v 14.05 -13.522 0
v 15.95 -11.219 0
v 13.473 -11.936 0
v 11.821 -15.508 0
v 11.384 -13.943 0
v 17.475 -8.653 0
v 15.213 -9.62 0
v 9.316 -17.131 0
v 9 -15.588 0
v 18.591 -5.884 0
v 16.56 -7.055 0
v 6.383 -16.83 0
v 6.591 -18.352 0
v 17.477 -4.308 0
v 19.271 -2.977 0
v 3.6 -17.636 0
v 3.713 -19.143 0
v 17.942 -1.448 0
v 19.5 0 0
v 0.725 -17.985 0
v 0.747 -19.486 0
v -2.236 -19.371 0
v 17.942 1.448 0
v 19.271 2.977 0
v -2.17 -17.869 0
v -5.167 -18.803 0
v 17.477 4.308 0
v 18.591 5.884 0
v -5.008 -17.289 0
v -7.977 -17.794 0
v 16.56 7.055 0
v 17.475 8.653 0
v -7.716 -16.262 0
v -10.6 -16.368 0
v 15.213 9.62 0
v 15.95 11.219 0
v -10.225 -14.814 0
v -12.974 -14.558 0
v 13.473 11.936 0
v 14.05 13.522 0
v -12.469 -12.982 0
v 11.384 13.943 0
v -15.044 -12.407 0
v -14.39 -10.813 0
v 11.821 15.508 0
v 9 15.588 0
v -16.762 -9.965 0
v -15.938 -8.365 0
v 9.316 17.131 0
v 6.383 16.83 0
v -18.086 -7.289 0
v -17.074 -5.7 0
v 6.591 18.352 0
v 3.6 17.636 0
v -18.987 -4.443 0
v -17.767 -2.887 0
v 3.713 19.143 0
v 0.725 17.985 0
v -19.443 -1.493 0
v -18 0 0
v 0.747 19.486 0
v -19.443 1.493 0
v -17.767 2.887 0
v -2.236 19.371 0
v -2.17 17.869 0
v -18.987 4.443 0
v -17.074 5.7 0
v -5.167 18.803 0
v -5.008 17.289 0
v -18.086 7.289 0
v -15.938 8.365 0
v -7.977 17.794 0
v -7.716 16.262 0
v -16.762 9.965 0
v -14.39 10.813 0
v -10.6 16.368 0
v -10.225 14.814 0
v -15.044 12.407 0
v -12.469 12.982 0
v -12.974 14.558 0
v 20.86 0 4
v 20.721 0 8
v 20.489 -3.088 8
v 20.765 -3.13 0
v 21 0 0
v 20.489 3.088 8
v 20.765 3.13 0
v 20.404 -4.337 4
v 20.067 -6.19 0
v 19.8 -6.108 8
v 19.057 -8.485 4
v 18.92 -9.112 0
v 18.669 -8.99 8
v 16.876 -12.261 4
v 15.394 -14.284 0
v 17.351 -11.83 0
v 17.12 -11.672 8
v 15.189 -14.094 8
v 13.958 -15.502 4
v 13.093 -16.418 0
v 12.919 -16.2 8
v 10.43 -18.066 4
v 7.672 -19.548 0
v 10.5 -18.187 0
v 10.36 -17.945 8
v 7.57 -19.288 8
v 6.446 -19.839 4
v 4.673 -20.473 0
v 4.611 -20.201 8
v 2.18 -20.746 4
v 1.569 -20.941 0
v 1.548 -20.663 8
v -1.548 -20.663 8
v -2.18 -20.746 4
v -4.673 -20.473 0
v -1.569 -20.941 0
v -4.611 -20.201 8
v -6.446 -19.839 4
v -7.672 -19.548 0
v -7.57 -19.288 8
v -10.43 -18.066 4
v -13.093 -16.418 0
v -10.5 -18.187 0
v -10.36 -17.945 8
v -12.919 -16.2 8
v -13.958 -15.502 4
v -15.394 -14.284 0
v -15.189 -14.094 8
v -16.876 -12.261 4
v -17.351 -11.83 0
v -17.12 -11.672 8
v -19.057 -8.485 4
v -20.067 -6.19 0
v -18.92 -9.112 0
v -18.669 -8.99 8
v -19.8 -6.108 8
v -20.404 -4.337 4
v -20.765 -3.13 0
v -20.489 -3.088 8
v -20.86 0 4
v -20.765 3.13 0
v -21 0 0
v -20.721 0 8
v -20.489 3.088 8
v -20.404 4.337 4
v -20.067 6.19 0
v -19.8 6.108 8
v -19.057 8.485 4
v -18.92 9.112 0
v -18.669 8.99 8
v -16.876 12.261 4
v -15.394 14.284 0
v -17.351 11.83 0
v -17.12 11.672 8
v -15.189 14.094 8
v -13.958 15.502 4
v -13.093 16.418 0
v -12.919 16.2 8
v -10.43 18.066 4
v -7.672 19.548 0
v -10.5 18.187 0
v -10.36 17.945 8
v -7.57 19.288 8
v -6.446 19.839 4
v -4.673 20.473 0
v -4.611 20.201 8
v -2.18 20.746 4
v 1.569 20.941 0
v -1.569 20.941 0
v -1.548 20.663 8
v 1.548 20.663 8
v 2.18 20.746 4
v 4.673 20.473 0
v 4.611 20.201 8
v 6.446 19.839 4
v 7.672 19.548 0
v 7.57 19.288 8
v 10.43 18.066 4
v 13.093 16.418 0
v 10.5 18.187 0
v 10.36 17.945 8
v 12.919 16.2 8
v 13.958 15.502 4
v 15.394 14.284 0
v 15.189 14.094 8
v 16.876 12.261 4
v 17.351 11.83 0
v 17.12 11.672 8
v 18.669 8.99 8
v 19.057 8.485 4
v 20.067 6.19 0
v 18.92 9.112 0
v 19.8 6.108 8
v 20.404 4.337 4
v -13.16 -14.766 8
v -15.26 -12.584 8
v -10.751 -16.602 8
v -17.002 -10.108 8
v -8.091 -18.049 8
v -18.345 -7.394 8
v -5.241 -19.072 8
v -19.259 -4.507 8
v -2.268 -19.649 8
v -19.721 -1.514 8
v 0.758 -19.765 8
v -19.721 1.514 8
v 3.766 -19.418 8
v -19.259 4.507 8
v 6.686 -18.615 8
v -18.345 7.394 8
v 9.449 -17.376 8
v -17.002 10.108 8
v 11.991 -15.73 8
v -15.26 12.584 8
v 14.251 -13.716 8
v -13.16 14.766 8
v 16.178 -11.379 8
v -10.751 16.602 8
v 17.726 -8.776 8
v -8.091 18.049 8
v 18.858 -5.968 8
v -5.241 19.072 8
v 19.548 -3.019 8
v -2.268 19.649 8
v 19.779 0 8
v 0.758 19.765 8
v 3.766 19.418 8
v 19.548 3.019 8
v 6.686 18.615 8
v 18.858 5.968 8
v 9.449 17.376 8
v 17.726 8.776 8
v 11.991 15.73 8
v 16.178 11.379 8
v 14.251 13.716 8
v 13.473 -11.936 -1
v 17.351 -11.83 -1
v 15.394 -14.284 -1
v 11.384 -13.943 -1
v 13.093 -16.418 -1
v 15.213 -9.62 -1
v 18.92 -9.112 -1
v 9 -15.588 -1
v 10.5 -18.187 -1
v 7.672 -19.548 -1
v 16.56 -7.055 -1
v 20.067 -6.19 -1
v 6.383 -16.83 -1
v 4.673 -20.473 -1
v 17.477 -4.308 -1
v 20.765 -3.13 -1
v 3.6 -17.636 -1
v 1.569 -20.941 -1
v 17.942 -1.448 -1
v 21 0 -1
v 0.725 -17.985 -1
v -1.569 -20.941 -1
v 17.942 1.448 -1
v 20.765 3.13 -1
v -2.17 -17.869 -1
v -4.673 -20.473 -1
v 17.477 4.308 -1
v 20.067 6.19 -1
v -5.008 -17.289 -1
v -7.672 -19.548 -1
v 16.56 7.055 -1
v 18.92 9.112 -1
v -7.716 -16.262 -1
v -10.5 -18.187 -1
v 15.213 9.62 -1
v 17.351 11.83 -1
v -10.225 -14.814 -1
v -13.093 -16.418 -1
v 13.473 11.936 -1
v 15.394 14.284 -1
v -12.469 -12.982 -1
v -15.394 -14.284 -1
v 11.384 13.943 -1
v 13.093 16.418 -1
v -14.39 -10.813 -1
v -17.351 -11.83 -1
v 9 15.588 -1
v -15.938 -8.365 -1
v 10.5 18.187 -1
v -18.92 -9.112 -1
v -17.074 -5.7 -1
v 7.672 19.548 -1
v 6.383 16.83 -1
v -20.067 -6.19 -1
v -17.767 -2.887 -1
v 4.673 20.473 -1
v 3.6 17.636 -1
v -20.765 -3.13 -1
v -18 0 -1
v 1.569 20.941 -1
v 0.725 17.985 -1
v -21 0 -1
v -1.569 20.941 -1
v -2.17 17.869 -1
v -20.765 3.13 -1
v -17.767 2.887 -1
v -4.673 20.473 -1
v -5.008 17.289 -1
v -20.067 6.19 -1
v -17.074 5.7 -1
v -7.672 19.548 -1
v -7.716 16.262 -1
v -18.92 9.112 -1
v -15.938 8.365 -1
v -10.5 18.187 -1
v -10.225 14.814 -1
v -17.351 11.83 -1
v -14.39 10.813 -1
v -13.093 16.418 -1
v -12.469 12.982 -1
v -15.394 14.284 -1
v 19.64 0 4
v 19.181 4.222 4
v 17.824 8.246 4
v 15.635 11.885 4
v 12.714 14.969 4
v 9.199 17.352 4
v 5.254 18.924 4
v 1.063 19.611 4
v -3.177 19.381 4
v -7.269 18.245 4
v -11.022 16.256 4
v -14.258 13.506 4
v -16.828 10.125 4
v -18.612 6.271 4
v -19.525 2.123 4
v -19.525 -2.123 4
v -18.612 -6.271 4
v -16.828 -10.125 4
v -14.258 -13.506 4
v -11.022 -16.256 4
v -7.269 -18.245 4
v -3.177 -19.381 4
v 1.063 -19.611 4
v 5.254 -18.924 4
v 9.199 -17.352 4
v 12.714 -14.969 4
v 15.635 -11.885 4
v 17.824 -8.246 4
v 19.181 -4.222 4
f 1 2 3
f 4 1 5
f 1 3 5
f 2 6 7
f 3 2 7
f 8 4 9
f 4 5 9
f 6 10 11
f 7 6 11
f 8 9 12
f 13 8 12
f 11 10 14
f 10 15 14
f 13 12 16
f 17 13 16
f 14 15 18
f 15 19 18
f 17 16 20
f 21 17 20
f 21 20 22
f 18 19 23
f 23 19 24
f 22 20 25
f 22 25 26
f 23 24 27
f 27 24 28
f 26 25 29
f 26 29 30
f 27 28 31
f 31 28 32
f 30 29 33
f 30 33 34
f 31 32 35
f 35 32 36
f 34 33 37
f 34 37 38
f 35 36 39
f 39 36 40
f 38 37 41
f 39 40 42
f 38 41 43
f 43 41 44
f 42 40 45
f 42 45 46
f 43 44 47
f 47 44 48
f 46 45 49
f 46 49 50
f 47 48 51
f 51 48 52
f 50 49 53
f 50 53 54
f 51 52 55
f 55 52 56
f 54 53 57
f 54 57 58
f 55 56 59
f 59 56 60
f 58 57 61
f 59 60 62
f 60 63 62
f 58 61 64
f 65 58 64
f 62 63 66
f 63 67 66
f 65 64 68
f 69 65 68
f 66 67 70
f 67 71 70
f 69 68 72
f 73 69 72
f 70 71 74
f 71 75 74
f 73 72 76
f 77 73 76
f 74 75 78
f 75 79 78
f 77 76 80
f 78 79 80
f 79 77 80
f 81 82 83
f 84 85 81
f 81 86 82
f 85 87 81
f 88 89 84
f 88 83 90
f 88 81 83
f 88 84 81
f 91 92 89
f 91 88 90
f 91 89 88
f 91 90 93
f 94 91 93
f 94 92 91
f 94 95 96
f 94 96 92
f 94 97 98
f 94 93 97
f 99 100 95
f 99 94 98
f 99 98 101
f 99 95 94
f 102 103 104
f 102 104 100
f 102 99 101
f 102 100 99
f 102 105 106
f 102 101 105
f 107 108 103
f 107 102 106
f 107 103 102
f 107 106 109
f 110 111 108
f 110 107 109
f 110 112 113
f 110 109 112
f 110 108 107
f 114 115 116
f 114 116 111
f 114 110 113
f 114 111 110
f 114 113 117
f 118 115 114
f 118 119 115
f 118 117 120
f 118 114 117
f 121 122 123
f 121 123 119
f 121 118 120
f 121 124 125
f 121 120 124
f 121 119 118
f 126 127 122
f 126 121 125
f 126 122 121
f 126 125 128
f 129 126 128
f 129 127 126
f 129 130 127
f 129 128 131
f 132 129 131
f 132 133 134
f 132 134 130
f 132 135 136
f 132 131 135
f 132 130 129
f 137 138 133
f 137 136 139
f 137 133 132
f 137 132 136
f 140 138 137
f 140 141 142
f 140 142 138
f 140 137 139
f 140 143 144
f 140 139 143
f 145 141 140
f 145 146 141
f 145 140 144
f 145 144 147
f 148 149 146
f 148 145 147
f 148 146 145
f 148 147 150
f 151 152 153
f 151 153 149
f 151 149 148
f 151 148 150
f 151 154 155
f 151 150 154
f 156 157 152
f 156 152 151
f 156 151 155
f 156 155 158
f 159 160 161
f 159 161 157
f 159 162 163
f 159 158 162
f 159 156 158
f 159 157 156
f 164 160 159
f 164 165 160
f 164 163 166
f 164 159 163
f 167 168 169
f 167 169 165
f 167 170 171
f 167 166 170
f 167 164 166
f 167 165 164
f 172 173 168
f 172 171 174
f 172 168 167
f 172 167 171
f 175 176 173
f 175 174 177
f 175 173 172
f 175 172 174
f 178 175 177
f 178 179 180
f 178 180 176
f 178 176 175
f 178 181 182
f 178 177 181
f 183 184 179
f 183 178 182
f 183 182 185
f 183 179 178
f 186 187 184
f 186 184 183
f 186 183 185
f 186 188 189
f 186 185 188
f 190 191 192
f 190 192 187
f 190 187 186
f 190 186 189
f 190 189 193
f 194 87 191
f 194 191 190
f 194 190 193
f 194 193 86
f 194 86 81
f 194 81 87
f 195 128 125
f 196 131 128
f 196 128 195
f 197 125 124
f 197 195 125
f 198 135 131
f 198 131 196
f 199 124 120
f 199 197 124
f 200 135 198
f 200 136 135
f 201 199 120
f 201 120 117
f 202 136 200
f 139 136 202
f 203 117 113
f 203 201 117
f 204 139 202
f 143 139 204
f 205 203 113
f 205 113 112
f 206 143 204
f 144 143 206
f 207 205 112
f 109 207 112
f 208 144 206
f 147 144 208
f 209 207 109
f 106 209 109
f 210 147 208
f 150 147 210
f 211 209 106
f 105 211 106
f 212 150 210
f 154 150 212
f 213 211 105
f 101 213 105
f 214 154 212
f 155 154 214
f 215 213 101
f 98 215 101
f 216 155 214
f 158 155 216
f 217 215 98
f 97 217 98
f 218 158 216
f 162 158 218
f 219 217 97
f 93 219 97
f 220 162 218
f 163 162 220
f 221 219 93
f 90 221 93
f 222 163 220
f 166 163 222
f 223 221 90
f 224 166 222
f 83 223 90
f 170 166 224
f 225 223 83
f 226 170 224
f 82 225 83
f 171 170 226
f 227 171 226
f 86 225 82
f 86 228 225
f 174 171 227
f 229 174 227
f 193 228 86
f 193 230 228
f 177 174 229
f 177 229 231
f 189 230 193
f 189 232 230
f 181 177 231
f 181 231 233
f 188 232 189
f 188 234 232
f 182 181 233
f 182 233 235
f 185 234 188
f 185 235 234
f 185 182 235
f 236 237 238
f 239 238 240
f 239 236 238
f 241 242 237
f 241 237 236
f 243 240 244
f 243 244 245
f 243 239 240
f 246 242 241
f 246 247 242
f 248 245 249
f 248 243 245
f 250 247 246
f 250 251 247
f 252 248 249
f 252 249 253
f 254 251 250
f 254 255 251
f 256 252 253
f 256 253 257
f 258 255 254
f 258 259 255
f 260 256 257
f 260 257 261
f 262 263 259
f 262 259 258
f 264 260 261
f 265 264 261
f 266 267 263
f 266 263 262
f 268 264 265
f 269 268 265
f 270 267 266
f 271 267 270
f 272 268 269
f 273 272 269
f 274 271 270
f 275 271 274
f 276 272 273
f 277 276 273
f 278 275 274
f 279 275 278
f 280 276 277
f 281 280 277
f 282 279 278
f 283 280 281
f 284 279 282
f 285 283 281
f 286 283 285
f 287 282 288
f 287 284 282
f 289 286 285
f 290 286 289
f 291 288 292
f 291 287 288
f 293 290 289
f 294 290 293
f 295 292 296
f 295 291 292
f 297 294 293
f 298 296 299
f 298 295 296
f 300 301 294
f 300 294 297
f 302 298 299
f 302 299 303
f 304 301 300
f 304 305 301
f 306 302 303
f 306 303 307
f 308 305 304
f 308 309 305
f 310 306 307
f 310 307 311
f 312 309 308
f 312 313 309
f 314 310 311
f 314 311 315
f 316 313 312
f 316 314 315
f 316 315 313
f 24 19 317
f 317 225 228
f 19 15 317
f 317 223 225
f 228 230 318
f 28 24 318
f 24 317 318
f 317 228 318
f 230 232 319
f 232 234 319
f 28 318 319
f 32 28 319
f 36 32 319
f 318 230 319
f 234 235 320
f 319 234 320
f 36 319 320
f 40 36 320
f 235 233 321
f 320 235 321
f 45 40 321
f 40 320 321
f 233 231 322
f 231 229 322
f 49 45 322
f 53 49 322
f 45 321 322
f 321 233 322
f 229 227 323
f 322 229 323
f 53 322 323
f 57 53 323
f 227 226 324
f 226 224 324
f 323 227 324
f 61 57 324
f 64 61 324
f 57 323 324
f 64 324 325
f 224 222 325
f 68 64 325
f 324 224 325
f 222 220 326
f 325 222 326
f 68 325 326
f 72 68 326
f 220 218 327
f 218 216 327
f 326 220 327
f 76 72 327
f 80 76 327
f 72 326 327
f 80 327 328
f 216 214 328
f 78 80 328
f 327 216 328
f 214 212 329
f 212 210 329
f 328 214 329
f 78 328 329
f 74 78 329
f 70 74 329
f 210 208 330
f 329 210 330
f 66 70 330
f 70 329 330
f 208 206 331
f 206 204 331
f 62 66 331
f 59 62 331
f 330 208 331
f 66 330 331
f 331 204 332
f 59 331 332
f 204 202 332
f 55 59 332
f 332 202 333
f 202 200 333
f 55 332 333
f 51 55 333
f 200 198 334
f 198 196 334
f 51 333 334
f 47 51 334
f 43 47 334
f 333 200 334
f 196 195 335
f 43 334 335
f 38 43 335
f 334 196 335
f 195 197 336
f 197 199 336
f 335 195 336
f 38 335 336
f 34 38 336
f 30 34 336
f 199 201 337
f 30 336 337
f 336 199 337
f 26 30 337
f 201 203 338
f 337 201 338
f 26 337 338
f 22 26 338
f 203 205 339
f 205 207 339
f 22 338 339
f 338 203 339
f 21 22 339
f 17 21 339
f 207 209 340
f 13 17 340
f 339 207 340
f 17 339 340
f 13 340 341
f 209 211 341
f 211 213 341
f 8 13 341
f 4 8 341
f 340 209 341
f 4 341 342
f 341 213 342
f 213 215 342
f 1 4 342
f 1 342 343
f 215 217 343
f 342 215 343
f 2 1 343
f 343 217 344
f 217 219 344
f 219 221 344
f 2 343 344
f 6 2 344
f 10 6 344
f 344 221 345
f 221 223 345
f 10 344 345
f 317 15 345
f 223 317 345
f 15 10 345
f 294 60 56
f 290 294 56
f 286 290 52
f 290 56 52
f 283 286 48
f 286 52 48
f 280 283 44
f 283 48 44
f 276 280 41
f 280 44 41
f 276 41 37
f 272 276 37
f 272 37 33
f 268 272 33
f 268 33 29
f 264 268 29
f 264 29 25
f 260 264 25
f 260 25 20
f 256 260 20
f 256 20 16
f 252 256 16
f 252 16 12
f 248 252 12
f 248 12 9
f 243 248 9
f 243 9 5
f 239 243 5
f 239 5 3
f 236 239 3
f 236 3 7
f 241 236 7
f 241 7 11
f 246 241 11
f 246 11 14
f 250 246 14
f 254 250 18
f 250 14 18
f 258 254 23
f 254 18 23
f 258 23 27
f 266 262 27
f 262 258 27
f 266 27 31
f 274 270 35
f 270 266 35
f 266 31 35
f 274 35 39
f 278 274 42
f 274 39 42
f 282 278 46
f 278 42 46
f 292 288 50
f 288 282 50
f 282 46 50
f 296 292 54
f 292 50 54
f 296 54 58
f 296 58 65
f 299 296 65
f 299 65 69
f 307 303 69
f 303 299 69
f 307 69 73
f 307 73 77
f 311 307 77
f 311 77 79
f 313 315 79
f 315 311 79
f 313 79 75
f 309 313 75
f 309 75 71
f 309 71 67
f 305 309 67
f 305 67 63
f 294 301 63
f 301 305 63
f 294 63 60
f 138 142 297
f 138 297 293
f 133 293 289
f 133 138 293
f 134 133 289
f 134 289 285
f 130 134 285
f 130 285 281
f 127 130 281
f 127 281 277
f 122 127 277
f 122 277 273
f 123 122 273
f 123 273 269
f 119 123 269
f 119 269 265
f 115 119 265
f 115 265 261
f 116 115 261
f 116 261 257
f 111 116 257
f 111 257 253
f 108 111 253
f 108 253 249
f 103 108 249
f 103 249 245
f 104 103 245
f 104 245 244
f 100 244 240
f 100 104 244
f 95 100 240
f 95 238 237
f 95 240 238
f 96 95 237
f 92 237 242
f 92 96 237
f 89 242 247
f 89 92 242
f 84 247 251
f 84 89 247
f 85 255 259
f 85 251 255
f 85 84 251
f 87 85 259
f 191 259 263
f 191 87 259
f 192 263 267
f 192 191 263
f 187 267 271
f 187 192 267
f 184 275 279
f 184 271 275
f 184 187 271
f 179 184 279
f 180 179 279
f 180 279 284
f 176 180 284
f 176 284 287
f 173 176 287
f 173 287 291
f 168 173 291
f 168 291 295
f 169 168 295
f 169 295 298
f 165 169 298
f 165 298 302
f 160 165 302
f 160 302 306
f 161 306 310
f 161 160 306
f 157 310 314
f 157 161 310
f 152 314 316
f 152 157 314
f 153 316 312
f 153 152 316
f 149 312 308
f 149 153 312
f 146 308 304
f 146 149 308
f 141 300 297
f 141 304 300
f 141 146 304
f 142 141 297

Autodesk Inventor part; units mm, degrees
ref_plane "YZ Plane" through (0, 0, 0) normal (1, 0, 0) x (0, 1, 0)
ref_plane "XZ Plane" through (0, 0, 0) normal (0, 1, 0) x (-1, 0, 0)
ref_plane "XY Plane" through (0, 0, 0) normal (0, 0, 1) x (1, 0, 0)
sketch "Skizze1" plane through (0, 0, 0) normal (0, 0, 1) x (1, 0, 0)
  circle A0 centre (0, 0) radius 19.5
  circle A1 centre (0, 0) radius 21
  dimension "d0" = 39
  dimension "d1" = 42
extrude "Extrusion1" add sketch "Skizze1" along normal blind 8 draft -2
sketch "Skizze2" plane through (0, 0, 0) normal (0, 0, -1) x (-1, 0, 0)
  circle A0 centre (0, 0) radius 19.6 projected
  circle A1 centre (0, 0) radius 21 projected
  circle A2 centre (0, 0) radius 18
  dimension "d4" = 36
extrude "Extrusion2" add sketch "Skizze2" along normal blind 1 contours A0 | A1
properties part number "00_Berrybase_CCTVLens_adapterring_50mm_to_100mm"
